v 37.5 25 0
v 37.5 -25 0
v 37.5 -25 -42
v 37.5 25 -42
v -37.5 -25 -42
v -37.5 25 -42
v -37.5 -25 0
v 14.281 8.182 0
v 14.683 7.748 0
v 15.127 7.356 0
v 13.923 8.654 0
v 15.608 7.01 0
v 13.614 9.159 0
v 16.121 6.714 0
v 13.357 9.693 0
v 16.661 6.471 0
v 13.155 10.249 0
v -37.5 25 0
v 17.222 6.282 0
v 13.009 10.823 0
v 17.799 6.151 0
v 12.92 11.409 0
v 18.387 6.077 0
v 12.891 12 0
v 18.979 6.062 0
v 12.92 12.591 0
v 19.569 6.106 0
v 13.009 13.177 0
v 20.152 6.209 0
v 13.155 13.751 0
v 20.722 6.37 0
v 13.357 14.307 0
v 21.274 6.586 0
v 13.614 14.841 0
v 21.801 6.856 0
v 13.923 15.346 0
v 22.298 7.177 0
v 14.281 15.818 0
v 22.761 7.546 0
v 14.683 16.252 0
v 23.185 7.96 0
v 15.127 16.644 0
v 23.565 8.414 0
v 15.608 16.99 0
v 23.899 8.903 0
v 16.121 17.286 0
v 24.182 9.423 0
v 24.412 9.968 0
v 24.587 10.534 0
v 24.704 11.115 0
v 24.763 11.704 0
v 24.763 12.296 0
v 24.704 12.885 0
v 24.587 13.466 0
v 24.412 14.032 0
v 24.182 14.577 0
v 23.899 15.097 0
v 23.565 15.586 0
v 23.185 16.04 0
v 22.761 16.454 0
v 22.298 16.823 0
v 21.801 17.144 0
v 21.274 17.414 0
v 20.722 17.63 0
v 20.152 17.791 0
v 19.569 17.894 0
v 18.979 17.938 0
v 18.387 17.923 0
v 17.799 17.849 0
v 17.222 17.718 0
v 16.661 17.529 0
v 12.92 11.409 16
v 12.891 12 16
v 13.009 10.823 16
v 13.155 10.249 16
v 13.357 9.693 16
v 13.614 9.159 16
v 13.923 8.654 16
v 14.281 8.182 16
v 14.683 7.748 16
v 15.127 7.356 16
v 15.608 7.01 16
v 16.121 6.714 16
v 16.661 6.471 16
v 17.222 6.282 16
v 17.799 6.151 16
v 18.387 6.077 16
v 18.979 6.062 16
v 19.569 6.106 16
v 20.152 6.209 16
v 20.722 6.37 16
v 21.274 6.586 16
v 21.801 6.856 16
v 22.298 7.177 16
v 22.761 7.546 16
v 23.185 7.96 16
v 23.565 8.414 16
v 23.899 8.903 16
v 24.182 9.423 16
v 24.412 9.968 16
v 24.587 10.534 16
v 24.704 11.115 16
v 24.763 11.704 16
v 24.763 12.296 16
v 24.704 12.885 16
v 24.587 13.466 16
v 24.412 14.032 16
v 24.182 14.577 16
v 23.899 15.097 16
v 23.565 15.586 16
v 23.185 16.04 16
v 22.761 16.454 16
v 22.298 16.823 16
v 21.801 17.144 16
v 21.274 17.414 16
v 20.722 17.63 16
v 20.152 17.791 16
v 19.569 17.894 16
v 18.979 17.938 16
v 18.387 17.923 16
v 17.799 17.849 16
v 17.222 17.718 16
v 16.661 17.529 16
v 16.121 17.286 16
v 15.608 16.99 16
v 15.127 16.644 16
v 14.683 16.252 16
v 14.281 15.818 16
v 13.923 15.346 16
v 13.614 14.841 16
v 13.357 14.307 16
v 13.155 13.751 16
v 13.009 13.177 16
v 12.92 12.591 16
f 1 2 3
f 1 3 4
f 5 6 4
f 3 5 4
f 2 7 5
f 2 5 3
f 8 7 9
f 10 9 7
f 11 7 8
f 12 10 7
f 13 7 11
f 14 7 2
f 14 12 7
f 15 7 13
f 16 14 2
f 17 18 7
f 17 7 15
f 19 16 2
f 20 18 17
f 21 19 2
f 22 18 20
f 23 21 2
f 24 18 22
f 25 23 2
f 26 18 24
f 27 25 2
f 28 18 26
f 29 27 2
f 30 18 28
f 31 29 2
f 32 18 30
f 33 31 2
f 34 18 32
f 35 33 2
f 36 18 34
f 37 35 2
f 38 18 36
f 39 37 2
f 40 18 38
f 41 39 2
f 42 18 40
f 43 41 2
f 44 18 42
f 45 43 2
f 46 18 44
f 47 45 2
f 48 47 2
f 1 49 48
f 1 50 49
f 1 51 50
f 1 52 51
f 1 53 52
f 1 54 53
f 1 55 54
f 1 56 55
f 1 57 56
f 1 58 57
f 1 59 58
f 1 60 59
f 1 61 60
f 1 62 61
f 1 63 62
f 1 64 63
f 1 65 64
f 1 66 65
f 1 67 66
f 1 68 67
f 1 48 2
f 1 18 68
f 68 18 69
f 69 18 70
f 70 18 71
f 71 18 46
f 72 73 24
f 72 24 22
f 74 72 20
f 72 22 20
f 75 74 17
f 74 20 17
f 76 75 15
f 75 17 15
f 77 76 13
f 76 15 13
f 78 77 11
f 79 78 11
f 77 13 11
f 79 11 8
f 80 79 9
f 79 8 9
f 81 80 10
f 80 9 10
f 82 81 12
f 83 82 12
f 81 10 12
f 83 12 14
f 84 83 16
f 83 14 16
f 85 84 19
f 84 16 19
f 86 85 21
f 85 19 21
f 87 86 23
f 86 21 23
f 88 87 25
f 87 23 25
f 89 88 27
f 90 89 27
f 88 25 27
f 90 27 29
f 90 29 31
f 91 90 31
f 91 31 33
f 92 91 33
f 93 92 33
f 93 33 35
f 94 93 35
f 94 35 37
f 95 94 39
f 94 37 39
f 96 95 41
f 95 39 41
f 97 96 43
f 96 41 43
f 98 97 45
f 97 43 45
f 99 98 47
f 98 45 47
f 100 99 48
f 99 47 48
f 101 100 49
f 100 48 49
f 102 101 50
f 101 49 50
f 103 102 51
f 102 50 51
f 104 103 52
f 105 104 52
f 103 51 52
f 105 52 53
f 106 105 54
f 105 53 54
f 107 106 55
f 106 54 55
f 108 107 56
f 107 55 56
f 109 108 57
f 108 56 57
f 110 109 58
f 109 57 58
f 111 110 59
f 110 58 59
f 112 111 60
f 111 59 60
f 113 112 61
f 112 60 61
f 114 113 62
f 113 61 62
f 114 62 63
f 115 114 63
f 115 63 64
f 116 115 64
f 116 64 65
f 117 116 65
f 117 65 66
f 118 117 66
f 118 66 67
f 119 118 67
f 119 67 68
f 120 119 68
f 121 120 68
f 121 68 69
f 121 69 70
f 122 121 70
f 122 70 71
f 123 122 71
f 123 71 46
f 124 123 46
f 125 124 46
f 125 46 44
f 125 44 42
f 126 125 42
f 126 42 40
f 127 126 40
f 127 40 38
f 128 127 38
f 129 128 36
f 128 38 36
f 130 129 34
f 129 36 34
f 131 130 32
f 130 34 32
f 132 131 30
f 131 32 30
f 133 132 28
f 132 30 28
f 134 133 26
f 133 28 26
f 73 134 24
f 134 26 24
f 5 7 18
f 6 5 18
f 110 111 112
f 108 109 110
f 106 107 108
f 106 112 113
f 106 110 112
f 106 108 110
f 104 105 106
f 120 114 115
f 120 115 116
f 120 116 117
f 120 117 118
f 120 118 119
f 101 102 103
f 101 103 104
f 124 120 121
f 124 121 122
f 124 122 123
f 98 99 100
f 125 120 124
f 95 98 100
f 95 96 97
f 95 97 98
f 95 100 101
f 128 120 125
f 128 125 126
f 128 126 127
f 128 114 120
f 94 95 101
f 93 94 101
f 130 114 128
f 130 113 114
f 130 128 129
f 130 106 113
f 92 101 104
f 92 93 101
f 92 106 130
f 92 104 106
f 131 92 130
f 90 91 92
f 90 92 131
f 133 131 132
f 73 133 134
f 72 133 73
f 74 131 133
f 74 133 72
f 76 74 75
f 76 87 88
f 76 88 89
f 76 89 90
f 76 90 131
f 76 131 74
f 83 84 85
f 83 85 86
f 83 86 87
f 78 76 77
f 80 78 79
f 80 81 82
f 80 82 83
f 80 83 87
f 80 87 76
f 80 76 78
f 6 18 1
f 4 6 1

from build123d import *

# Parameters (mm, degrees)
CROQUIS1_W              = 75
CROQUIS1_H              = 50
SALIENTE_EXTRUIR1_DEPTH = 42
CROQUIS2_R              = 5.939733441
SALIENTE_EXTRUIR2_DEPTH = 16


with BuildPart() as part:
    # Croquis1 → Saliente-Extruir1 (new body)
    with BuildSketch(Plane.XY):
        Rectangle(CROQUIS1_W, CROQUIS1_H)
    extrude(amount=-SALIENTE_EXTRUIR1_DEPTH)

    # Croquis2 → Saliente-Extruir2 (add)
    with BuildSketch(Plane.XY):
        with Locations(Location((18.830639627, 12, 0), (0, 0, 180))):
            Circle(CROQUIS2_R)
    extrude(amount=SALIENTE_EXTRUIR2_DEPTH)


solid = part.part
